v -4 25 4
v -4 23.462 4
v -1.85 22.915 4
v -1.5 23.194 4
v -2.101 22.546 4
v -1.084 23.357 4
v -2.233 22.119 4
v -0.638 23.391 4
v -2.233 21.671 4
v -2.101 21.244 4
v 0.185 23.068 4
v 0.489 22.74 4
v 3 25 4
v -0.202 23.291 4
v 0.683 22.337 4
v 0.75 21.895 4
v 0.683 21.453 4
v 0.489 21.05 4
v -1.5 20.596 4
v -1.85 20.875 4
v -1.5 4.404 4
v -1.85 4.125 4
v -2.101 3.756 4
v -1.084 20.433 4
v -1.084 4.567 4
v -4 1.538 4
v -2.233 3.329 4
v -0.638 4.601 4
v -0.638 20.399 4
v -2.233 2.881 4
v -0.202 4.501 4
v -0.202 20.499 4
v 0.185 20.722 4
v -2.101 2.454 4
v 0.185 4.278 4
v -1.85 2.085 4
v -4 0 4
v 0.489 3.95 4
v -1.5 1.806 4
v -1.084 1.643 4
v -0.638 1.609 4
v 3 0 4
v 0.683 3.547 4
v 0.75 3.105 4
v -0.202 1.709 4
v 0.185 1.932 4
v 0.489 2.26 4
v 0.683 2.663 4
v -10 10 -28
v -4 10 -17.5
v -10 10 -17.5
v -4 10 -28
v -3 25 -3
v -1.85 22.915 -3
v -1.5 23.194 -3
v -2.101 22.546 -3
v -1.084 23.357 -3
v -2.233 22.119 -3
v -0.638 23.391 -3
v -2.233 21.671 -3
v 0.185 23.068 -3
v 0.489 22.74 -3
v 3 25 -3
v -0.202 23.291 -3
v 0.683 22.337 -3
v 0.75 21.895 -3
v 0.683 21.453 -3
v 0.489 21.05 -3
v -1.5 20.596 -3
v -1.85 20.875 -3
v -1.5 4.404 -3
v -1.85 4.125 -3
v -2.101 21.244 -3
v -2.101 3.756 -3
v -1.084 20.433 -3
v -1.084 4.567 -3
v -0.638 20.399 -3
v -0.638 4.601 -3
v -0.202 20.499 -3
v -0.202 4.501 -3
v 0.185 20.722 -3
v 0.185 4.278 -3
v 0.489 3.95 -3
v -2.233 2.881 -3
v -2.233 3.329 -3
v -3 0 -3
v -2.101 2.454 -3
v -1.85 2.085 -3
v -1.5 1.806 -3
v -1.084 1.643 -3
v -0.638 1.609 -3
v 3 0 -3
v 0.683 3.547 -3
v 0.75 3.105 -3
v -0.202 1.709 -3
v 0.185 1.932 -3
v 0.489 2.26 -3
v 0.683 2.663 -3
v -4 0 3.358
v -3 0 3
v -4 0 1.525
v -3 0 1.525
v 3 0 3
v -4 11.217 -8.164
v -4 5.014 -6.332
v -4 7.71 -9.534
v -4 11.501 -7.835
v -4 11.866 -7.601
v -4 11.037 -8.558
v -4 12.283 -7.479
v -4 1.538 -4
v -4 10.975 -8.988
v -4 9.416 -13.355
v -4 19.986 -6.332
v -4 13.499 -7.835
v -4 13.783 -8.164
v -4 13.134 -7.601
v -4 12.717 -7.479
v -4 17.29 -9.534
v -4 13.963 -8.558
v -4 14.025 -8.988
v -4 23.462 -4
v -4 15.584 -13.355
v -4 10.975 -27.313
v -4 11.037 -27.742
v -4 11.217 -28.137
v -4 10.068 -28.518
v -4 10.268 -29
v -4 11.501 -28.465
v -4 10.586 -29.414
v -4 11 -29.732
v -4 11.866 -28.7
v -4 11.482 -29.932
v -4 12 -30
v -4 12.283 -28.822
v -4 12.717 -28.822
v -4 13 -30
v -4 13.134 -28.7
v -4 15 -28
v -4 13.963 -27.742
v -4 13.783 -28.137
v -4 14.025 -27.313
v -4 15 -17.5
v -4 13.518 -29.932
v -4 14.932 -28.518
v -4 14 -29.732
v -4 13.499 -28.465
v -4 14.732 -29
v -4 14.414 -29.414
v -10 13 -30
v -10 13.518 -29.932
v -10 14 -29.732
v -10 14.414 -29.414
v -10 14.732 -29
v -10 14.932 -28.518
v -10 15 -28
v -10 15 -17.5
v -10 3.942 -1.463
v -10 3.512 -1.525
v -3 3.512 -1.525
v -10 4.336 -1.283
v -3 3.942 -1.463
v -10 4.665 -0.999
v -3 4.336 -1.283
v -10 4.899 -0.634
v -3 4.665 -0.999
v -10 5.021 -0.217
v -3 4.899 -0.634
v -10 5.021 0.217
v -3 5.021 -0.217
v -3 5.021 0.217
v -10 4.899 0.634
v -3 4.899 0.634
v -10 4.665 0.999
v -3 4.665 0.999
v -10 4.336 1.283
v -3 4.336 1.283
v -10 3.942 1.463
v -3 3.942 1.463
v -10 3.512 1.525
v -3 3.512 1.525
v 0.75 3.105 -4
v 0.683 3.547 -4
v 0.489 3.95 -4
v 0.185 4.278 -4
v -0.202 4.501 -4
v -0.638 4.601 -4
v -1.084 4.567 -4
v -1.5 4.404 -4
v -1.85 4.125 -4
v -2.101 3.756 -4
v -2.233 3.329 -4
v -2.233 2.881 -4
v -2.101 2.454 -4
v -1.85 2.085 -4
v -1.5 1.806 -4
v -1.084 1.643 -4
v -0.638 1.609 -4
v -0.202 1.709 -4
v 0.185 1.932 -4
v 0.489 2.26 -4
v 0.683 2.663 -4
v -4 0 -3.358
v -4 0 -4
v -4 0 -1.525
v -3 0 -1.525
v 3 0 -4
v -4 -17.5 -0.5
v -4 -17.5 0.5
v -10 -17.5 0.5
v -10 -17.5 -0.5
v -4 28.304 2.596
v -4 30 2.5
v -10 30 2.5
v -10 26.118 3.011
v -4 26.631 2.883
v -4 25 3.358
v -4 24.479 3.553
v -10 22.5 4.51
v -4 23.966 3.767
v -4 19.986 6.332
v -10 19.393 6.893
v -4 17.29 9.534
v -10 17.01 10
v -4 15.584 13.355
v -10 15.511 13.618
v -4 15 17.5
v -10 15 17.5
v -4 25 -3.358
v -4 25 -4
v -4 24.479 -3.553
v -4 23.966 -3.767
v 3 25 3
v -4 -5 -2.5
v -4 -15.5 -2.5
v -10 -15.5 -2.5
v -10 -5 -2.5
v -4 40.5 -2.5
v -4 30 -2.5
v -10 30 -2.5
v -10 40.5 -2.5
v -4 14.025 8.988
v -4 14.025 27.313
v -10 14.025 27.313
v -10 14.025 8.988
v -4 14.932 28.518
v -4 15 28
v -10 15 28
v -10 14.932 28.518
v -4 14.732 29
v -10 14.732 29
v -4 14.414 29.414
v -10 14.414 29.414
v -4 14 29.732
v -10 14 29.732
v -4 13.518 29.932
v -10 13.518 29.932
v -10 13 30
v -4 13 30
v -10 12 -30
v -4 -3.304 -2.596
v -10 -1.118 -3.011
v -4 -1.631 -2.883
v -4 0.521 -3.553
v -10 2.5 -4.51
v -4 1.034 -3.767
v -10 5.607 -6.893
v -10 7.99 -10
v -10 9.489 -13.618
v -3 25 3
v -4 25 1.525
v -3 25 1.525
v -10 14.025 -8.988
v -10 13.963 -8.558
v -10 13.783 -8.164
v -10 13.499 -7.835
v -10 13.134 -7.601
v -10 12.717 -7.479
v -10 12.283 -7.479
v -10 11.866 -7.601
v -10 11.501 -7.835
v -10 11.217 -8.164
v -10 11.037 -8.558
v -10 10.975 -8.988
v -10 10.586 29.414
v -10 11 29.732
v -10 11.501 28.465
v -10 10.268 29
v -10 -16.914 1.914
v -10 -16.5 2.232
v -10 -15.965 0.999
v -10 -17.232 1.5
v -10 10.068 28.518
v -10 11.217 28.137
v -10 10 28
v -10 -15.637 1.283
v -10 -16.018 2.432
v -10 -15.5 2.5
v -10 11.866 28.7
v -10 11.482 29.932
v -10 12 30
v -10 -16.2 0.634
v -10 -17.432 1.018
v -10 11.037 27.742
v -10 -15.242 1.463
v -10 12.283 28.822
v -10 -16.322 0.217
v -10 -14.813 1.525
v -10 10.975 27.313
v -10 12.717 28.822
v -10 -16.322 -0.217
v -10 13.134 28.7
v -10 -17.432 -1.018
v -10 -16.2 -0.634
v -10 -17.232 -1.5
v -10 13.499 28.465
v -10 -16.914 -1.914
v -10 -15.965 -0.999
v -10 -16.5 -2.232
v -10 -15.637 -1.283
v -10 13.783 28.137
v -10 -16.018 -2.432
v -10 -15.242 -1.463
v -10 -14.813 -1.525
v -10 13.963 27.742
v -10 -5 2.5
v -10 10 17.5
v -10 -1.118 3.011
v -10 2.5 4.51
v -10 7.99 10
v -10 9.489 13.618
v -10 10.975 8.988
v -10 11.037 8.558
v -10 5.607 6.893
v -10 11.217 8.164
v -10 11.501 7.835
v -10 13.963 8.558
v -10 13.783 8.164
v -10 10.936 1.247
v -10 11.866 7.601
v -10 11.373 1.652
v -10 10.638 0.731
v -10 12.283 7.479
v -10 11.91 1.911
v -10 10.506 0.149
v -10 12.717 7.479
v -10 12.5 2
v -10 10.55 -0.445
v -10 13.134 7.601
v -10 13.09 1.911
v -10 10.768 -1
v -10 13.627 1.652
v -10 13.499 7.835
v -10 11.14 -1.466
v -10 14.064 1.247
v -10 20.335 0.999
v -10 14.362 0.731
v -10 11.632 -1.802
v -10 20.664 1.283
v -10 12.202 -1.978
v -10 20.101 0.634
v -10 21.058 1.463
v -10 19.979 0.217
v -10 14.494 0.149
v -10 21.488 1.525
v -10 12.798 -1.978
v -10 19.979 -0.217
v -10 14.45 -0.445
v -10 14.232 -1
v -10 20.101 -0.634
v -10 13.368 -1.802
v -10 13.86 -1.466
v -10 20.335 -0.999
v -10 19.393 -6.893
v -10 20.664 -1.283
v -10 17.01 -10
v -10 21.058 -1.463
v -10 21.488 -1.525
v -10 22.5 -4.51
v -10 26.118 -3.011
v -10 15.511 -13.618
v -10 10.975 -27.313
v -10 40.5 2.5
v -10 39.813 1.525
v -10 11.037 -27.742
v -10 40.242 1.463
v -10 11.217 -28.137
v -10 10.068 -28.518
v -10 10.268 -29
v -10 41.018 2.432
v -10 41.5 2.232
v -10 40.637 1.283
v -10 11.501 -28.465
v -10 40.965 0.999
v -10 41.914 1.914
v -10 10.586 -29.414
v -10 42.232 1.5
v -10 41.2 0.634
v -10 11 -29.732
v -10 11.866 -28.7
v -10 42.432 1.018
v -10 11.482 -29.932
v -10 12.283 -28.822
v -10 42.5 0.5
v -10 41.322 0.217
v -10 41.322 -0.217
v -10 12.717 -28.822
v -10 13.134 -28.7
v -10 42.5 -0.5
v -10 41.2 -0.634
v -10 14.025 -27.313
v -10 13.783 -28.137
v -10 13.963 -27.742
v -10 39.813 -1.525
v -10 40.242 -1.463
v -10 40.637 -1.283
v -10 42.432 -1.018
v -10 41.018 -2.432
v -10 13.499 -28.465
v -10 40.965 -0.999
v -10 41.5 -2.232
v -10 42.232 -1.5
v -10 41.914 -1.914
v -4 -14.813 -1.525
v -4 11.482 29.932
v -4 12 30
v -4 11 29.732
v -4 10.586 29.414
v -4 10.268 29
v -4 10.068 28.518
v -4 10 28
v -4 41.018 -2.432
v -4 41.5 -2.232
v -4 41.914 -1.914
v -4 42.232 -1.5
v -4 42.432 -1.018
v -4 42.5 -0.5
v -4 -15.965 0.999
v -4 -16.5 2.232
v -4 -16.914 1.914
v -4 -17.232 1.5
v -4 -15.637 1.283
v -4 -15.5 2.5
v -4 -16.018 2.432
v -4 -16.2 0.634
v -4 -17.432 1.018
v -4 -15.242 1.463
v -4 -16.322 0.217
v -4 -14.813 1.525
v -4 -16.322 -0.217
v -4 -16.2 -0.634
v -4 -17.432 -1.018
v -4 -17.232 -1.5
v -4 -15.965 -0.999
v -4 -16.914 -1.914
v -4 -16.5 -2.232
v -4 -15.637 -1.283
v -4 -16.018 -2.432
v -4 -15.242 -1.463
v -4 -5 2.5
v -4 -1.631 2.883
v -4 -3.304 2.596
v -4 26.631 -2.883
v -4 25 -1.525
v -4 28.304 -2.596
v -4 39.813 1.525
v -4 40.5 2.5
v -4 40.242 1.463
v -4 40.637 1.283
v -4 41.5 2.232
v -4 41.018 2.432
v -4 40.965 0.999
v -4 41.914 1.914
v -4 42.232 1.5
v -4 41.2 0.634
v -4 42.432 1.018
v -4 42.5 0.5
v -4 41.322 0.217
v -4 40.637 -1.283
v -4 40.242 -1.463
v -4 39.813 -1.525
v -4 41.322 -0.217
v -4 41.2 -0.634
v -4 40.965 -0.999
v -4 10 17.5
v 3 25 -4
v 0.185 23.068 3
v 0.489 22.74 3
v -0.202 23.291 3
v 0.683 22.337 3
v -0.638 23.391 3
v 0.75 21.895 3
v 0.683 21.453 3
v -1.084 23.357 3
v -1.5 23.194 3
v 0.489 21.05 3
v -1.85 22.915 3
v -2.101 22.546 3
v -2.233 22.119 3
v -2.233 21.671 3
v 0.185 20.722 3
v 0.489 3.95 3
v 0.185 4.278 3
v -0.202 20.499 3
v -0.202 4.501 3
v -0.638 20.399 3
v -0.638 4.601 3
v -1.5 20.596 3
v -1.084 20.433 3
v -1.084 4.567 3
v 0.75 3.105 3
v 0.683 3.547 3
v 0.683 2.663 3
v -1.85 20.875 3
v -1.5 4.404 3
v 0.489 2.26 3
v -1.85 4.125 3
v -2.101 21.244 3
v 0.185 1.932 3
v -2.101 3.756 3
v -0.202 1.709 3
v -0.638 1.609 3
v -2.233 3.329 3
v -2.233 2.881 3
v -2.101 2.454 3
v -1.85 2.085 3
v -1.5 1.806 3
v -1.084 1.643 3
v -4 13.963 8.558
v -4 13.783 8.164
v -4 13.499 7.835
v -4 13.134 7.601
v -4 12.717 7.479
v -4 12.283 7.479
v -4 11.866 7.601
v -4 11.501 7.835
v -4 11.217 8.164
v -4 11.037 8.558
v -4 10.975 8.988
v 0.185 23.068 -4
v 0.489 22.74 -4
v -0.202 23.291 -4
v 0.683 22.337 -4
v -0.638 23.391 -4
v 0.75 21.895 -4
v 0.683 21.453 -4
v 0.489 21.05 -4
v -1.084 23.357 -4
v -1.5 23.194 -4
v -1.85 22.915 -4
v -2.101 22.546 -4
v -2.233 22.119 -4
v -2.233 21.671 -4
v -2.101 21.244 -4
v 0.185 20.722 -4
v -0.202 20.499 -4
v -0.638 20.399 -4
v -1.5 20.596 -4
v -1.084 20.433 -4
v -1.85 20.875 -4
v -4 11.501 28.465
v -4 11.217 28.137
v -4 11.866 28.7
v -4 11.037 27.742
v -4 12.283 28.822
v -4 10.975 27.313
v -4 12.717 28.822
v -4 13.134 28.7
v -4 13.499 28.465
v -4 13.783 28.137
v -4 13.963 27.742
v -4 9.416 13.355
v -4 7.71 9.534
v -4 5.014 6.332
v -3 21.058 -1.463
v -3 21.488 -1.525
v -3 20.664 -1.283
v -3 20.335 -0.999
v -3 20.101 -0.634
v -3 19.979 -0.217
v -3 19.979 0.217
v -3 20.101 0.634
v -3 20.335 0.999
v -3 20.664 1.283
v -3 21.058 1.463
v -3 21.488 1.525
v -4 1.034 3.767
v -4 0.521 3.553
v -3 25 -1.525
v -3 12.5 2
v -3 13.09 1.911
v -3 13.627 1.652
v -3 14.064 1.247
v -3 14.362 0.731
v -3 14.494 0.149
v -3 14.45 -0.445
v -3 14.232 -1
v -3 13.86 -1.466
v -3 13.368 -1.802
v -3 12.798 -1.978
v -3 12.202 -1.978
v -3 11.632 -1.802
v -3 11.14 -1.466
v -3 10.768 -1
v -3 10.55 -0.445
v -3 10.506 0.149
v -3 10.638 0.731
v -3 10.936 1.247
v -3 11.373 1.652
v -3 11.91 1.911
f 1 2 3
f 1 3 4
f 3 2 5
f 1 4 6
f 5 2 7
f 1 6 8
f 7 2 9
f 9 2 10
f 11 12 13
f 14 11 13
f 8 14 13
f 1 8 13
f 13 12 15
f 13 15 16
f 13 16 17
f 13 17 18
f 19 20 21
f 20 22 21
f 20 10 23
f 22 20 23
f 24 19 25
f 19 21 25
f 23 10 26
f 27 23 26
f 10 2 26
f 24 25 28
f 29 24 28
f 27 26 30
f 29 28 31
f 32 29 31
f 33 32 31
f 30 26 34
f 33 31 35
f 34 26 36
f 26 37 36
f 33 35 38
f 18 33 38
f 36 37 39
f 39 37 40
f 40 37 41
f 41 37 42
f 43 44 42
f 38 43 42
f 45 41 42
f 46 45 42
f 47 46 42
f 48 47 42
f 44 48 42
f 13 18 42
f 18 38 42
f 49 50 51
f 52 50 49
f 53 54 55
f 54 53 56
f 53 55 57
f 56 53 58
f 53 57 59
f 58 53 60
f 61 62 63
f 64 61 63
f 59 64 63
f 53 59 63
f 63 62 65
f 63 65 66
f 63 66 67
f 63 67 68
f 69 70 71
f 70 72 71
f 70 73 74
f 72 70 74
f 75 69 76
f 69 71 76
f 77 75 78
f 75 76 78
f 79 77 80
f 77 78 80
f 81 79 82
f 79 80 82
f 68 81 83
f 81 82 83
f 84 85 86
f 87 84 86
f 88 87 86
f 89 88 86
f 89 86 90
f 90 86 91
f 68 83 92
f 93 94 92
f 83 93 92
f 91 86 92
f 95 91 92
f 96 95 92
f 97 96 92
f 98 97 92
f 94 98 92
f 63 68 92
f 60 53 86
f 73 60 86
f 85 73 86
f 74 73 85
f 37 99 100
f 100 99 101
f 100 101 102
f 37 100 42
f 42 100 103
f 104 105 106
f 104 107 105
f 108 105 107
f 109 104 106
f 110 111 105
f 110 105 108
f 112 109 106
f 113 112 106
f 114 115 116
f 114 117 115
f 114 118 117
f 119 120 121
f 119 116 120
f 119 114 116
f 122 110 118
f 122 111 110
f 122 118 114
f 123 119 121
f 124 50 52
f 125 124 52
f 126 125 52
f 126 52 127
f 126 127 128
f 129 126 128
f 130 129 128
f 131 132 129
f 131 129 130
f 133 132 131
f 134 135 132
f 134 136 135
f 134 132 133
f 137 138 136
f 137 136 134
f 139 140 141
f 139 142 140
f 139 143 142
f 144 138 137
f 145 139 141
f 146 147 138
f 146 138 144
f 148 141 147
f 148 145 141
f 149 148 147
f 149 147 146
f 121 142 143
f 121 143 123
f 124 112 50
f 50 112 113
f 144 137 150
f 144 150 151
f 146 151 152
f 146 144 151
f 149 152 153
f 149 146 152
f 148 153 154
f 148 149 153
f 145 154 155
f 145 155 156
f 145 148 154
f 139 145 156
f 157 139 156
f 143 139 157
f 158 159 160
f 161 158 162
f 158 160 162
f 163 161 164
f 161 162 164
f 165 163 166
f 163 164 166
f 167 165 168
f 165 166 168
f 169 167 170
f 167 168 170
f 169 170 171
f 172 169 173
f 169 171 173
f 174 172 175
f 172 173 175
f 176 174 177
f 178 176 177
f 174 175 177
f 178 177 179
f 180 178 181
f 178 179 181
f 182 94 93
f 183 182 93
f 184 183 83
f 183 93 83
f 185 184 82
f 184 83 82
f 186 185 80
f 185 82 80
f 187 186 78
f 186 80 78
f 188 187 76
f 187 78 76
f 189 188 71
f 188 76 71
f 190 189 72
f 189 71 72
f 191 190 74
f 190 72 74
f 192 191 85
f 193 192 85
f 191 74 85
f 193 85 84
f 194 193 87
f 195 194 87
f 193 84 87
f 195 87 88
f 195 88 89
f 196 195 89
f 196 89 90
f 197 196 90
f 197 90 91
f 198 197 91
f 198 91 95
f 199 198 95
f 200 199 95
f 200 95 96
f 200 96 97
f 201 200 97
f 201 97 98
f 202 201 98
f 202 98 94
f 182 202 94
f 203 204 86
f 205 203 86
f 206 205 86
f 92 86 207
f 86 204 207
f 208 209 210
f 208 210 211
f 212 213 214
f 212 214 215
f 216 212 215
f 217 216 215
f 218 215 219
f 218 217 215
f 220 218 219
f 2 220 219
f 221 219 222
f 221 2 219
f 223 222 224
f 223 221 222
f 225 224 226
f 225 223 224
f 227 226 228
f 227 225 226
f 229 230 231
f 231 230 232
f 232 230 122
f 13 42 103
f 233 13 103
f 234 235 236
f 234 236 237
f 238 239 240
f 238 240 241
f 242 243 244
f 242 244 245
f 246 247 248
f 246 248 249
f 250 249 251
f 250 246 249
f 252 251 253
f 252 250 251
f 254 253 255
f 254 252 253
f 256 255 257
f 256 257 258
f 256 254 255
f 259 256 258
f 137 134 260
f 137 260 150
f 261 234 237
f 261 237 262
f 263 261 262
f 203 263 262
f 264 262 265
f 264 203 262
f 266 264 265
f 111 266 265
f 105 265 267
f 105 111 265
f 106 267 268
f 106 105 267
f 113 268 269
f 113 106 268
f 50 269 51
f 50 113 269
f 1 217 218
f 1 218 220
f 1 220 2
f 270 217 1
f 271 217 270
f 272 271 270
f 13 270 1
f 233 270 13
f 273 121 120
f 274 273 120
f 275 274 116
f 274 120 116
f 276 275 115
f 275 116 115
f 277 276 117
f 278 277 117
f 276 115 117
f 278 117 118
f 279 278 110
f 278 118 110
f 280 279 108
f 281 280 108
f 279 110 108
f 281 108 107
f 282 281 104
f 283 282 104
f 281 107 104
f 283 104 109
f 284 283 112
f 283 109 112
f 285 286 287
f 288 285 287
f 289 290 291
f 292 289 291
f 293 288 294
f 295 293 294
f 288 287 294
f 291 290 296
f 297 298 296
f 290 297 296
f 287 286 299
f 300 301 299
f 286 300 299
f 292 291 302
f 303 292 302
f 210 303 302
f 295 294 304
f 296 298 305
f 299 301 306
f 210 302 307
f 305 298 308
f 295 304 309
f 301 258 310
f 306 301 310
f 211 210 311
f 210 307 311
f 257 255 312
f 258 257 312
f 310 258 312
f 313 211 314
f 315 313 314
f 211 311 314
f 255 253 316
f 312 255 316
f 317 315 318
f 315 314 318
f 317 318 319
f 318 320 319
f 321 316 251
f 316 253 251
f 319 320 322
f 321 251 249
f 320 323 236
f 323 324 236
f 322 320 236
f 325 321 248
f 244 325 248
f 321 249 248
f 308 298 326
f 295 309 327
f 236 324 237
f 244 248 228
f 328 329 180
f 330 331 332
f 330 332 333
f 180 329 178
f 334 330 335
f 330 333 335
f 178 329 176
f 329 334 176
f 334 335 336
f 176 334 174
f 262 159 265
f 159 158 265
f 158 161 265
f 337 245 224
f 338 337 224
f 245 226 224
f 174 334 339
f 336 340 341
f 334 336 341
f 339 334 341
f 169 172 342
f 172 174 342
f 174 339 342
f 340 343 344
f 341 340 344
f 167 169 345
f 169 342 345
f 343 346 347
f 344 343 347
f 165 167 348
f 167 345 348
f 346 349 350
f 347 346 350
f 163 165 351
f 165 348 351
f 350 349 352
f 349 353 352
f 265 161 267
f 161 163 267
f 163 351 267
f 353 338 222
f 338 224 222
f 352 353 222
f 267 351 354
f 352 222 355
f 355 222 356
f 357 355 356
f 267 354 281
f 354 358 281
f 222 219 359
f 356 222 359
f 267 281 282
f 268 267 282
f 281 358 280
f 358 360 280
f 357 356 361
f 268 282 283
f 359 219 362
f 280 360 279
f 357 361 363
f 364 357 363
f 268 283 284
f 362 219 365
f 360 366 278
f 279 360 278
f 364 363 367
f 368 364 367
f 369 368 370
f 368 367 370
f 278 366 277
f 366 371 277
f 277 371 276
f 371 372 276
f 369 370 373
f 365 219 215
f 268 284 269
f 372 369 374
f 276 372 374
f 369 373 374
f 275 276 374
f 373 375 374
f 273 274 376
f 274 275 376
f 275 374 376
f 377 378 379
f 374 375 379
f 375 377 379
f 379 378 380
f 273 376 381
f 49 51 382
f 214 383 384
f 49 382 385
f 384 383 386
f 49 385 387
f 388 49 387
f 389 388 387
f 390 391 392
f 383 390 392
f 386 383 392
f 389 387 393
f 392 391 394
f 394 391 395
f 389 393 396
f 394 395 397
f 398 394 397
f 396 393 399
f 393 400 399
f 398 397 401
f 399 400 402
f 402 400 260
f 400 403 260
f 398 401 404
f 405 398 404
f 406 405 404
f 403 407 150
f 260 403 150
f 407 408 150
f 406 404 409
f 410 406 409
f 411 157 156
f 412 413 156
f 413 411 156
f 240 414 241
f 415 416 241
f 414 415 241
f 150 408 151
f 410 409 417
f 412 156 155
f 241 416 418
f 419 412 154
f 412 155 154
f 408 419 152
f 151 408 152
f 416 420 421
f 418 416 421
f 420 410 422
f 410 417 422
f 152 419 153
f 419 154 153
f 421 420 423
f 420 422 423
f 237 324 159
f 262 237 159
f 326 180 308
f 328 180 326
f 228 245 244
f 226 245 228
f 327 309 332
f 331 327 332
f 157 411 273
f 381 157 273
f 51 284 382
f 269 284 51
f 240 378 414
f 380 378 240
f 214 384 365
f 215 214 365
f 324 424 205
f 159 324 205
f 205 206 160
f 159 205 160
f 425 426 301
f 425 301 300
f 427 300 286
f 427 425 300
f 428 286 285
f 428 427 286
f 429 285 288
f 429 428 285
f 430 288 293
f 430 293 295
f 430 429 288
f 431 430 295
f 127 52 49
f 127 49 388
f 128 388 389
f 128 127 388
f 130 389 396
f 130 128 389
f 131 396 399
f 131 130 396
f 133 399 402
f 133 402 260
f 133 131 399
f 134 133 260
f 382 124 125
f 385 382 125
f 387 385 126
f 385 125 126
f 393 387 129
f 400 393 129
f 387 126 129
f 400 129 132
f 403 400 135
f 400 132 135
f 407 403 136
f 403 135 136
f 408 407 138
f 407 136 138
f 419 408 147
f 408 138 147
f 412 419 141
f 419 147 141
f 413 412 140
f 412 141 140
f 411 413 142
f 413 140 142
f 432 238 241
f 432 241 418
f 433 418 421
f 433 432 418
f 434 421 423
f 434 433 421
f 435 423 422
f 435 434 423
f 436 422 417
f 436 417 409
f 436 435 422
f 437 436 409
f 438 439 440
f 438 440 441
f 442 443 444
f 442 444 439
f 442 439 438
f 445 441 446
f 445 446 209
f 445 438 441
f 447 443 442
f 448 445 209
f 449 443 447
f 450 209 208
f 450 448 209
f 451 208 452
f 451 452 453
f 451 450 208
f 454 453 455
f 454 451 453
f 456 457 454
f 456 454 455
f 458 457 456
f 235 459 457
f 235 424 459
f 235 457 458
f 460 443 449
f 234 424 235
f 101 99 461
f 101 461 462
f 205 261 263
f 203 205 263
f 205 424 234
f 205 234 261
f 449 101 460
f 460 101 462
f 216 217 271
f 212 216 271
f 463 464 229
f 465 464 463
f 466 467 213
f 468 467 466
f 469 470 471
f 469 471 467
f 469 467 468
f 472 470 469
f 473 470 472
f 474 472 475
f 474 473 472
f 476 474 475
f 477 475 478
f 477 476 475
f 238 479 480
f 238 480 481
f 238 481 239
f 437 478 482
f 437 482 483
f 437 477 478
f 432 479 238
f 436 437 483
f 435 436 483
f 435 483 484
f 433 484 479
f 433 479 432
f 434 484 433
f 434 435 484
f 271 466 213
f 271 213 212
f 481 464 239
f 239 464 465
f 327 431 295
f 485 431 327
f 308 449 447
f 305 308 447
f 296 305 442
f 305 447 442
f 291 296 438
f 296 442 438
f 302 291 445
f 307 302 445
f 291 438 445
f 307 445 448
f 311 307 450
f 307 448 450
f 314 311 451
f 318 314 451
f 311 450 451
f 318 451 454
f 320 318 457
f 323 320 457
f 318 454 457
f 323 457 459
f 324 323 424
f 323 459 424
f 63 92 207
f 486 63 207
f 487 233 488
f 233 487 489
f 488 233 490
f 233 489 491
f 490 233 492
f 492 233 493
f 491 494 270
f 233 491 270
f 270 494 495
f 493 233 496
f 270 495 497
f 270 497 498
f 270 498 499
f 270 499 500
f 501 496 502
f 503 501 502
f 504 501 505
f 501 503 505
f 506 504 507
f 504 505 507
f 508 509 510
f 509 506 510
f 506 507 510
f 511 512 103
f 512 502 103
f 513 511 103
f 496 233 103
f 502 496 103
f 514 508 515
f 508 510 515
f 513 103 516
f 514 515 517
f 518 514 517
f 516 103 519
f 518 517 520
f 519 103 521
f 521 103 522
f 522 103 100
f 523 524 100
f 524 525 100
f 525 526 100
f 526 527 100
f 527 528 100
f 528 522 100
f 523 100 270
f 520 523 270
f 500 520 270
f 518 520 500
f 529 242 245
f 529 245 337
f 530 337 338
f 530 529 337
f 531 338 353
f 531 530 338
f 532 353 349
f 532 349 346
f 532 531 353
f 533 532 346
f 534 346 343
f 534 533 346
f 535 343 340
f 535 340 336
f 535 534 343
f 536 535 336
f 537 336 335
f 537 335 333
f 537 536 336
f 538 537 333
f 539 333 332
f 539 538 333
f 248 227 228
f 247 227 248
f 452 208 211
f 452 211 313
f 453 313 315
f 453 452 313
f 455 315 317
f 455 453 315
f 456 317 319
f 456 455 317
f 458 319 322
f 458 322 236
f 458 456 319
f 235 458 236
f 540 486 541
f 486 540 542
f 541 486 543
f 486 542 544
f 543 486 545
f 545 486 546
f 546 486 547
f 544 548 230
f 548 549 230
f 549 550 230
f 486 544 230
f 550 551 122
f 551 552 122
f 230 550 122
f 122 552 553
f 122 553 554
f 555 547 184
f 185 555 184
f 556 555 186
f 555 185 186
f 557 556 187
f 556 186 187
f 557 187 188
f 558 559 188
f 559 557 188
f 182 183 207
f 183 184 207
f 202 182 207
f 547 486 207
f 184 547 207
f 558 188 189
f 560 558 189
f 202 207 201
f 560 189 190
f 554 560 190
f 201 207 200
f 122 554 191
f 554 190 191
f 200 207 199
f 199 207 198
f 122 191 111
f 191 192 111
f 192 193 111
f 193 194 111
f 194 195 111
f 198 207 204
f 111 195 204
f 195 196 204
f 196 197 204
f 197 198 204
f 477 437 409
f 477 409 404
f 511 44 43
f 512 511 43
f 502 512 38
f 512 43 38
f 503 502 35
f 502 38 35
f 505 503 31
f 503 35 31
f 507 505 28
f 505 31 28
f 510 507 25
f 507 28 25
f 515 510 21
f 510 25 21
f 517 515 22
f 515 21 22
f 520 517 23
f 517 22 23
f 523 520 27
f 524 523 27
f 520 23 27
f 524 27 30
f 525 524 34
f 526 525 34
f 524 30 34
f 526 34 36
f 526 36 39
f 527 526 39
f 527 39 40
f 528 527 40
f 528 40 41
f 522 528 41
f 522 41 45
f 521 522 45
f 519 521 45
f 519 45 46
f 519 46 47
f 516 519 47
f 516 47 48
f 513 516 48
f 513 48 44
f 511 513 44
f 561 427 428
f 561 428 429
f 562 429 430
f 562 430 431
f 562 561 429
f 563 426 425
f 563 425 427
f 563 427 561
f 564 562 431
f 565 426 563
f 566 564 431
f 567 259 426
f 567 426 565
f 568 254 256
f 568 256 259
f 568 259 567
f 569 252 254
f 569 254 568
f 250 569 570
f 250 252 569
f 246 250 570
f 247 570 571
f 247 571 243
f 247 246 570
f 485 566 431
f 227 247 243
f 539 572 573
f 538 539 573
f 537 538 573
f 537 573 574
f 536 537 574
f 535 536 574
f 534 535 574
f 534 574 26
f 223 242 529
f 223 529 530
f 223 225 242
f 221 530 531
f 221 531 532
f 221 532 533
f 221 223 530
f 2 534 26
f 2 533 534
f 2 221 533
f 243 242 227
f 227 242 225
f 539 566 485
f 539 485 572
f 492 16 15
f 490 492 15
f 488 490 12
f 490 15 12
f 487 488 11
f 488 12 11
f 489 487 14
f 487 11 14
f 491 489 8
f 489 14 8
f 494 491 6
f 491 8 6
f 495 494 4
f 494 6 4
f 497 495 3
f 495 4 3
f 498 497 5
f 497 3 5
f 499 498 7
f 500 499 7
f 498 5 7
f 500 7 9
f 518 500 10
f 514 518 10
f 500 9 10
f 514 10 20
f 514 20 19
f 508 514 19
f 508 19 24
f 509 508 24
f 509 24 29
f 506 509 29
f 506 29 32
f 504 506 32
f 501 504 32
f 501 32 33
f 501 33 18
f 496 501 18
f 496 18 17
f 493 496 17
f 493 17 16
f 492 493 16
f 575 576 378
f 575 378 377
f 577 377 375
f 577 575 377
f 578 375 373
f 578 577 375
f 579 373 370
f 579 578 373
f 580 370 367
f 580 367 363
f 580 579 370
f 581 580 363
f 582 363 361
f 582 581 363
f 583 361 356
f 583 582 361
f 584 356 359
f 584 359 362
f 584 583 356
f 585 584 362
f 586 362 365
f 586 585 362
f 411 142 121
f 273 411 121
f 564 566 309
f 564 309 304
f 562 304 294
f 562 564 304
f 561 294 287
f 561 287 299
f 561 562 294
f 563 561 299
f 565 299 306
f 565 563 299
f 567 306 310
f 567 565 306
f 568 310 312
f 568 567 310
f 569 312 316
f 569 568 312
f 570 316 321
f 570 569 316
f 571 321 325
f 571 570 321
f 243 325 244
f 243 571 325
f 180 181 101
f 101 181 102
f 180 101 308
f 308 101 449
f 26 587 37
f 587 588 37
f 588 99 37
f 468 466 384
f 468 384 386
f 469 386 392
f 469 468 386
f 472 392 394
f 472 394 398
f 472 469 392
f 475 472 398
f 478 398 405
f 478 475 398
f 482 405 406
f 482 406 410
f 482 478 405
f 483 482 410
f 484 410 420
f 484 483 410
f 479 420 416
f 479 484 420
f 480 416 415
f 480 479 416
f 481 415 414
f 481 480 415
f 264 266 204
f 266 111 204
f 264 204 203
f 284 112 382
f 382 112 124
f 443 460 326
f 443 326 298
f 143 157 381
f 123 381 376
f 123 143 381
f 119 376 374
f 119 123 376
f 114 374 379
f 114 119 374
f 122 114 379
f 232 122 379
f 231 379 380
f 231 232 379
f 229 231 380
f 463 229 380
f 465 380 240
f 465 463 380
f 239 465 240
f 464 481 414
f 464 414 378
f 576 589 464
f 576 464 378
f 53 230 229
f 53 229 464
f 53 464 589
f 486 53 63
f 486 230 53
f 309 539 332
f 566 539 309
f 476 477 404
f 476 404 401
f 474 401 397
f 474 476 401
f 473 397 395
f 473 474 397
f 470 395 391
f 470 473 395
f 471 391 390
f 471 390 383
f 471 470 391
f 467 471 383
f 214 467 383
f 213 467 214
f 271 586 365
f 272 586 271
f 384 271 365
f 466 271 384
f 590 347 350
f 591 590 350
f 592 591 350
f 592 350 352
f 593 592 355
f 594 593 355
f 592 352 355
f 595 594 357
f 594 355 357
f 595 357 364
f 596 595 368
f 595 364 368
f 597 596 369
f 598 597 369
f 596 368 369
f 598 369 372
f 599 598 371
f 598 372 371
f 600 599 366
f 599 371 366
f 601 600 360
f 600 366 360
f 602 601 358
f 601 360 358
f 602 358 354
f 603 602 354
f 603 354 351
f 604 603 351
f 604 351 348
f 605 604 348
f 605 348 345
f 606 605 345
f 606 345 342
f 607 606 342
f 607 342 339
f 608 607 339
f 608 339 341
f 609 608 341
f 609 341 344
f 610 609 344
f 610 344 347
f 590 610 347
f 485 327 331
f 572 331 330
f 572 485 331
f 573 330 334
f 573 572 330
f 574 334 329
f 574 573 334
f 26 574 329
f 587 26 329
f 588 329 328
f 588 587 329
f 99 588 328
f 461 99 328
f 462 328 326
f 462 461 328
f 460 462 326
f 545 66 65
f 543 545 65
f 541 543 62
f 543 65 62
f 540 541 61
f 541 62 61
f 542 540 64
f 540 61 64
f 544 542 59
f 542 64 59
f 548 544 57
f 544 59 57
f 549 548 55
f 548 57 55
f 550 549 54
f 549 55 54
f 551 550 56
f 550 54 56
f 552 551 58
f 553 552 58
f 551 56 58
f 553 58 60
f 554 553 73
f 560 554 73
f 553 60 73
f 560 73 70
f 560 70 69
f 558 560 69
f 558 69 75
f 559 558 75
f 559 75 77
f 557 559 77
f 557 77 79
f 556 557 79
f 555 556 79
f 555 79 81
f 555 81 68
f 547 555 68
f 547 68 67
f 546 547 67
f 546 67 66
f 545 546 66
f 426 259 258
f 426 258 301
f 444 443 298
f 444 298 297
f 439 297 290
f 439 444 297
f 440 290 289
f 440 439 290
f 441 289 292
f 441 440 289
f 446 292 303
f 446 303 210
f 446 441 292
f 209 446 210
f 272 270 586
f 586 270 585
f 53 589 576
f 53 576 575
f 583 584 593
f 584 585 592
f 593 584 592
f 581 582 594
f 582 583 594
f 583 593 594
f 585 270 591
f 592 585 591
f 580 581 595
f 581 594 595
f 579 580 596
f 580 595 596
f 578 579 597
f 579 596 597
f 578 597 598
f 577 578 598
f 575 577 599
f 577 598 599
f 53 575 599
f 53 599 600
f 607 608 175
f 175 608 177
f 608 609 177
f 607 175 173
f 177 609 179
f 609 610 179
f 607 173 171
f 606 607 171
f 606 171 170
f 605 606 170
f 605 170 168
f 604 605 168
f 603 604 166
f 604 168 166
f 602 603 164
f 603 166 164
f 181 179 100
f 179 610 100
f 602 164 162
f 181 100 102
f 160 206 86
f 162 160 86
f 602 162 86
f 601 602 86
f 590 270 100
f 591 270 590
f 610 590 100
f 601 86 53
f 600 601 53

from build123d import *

# Parameters (mm, degrees)
BOSS_EXTRUDE1_DEPTH = 25
SKETCH2_R           = 1.5
CUT_EXTRUDE1_DEPTH  = 100
BOSS_EXTRUDE2_DEPTH = 6
CUT_EXTRUDE2_START  = -6
CUT_EXTRUDE2_DEPTH  = 6
CUT_EXTRUDE3_START  = -6
CUT_EXTRUDE3_DEPTH  = 6
SKETCH6_R           = 2
CUT_EXTRUDE4_DEPTH  = 60


with BuildPart() as part:
    # Sketch1 → Boss-Extrude1 (new body)
    with BuildSketch(Plane(origin=(0, 0, 0), x_dir=(1, 0, 0), z_dir=(0, 1, 0))):
        Polygon((-3, 3), (3, 3), (3, 4), (-4, 4), (-4, -4), (3, -4), (3, -3), (-3, -3), align=None)
    extrude(amount=BOSS_EXTRUDE1_DEPTH)

    # Sketch2 → Cut-Extrude1 (cut)
    with BuildSketch(Plane.XY.offset(4)):
        with Locations((-0.75, 3.105)):
            Circle(SKETCH2_R)
        with Locations((-0.75, 21.895)):
            Circle(SKETCH2_R)
    extrude(amount=-CUT_EXTRUDE1_DEPTH, mode=Mode.SUBTRACT)

    # Sketch3 → Boss-Extrude2 (add)
    with BuildSketch(Plane.ZY.offset(4)):
        with BuildLine():
            Line((0.5, 42.5), (-0.5, 42.5))
            ThreePointArc((-0.5, 42.5), (-1.914213562, 41.914213562), (-2.5, 40.5))
            Line((-2.5, 40.5), (-2.5, 30))
            ThreePointArc((-2.5, 30), (-6.893398282, 19.393398282), (-17.5, 15))
            Line((-17.5, 15), (-28, 15))
            ThreePointArc((-28, 15), (-29.414213562, 14.414213562), (-30, 13))
            Line((-30, 13), (-30, 12))
            ThreePointArc((-30, 12), (-29.414213562, 10.585786438), (-28, 10))
            Line((-28, 10), (-17.5, 10))
            ThreePointArc((-17.5, 10), (-6.893398282, 5.606601718), (-2.5, -5))
            Line((-2.5, -5), (-2.5, -15.5))
            ThreePointArc((-2.5, -15.5), (-1.914213562, -16.914213562), (-0.5, -17.5))
            Line((-0.5, -17.5), (0.5, -17.5))
            ThreePointArc((0.5, -17.5), (1.914213562, -16.914213562), (2.5, -15.5))
            Line((2.5, -15.5), (2.5, -5))
            ThreePointArc((2.5, -5), (6.893398282, 5.606601718), (17.5, 10))
            Line((17.5, 10), (28, 10))
            ThreePointArc((28, 10), (29.414213562, 10.585786438), (30, 12))
            Line((30, 12), (30, 13))
            ThreePointArc((30, 13), (29.414213562, 14.414213562), (28, 15))
            Line((28, 15), (17.5, 15))
            ThreePointArc((17.5, 15), (6.893398282, 19.393398282), (2.5, 30))
            Line((2.5, 30), (2.5, 40.5))
            ThreePointArc((2.5, 40.5), (1.914213562, 41.914213562), (0.5, 42.5))
        make_face()
        with BuildLine():
            Line((1.525, 39.812785606), (1.525, 21.487997416))
            ThreePointArc((1.525, 21.487997416), (0, 19.962997416), (-1.525, 21.487997416))
            Line((-1.525, 21.487997416), (-1.525, 39.812785606))
            ThreePointArc((-1.525, 39.812785606), (0, 41.337785606), (1.525, 39.812785606))
        make_face(mode=Mode.SUBTRACT)
        with BuildLine():
            Line((1.525, 3.512002584), (1.525, -14.812785606))
            ThreePointArc((1.525, -14.812785606), (0, -16.337785606), (-1.525, -14.812785606))
            Line((-1.525, -14.812785606), (-1.525, 3.512002584))
            ThreePointArc((-1.525, 3.512002584), (0, 5.037002584), (1.525, 3.512002584))
        make_face(mode=Mode.SUBTRACT)
        with BuildLine():
            ThreePointArc((27.312785606, 14.025), (28.837785606, 12.5), (27.312785606, 10.975))
            Line((27.312785606, 10.975), (8.987997416, 10.975))
            ThreePointArc((8.987997416, 10.975), (7.462997416, 12.5), (8.987997416, 14.025))
            Line((8.987997416, 14.025), (27.312785606, 14.025))
        make_face(mode=Mode.SUBTRACT)
        with BuildLine():
            Line((-27.312785606, 14.025), (-8.987997416, 14.025))
            ThreePointArc((-8.987997416, 14.025), (-7.462997416, 12.5), (-8.987997416, 10.975))
            Line((-8.987997416, 10.975), (-27.312785606, 10.975))
            ThreePointArc((-27.312785606, 10.975), (-28.837785606, 12.5), (-27.312785606, 14.025))
        make_face(mode=Mode.SUBTRACT)
    extrude(amount=BOSS_EXTRUDE2_DEPTH)

    # Sketch3<4> → Cut-Extrude2 (cut)
    with BuildSketch(Plane.ZY.offset(4).offset(CUT_EXTRUDE2_START)):
        with BuildLine():
            Line((-1.525, -14.812785606), (-1.525, 3.512002584))
            ThreePointArc((-1.525, 3.512002584), (0, 5.037002584), (1.525, 3.512002584))
            Line((1.525, 3.512002584), (1.525, -14.812785606))
            ThreePointArc((1.525, -14.812785606), (0, -16.337785606), (-1.525, -14.812785606))
        make_face()
    extrude(amount=CUT_EXTRUDE2_DEPTH, mode=Mode.SUBTRACT)

    # Sketch3<5> → Cut-Extrude3 (cut)
    with BuildSketch(Plane.ZY.offset(4).offset(CUT_EXTRUDE3_START)):
        with BuildLine():
            Line((-1.525, 39.812785606), (-1.525, 21.487997416))
            ThreePointArc((-1.525, 21.487997416), (0, 19.962997416), (1.525, 21.487997416))
            Line((1.525, 21.487997416), (1.525, 39.812785606))
            ThreePointArc((1.525, 39.812785606), (0, 41.337785606), (-1.525, 39.812785606))
        make_face()
    extrude(amount=CUT_EXTRUDE3_DEPTH, mode=Mode.SUBTRACT)

    # Sketch6 → Cut-Extrude4 (cut)
    with BuildSketch(Plane.ZY.offset(10)):
        with Locations((0, 12.5)):
            Circle(SKETCH6_R)
    extrude(amount=-CUT_EXTRUDE4_DEPTH, mode=Mode.SUBTRACT)


solid = part.part
